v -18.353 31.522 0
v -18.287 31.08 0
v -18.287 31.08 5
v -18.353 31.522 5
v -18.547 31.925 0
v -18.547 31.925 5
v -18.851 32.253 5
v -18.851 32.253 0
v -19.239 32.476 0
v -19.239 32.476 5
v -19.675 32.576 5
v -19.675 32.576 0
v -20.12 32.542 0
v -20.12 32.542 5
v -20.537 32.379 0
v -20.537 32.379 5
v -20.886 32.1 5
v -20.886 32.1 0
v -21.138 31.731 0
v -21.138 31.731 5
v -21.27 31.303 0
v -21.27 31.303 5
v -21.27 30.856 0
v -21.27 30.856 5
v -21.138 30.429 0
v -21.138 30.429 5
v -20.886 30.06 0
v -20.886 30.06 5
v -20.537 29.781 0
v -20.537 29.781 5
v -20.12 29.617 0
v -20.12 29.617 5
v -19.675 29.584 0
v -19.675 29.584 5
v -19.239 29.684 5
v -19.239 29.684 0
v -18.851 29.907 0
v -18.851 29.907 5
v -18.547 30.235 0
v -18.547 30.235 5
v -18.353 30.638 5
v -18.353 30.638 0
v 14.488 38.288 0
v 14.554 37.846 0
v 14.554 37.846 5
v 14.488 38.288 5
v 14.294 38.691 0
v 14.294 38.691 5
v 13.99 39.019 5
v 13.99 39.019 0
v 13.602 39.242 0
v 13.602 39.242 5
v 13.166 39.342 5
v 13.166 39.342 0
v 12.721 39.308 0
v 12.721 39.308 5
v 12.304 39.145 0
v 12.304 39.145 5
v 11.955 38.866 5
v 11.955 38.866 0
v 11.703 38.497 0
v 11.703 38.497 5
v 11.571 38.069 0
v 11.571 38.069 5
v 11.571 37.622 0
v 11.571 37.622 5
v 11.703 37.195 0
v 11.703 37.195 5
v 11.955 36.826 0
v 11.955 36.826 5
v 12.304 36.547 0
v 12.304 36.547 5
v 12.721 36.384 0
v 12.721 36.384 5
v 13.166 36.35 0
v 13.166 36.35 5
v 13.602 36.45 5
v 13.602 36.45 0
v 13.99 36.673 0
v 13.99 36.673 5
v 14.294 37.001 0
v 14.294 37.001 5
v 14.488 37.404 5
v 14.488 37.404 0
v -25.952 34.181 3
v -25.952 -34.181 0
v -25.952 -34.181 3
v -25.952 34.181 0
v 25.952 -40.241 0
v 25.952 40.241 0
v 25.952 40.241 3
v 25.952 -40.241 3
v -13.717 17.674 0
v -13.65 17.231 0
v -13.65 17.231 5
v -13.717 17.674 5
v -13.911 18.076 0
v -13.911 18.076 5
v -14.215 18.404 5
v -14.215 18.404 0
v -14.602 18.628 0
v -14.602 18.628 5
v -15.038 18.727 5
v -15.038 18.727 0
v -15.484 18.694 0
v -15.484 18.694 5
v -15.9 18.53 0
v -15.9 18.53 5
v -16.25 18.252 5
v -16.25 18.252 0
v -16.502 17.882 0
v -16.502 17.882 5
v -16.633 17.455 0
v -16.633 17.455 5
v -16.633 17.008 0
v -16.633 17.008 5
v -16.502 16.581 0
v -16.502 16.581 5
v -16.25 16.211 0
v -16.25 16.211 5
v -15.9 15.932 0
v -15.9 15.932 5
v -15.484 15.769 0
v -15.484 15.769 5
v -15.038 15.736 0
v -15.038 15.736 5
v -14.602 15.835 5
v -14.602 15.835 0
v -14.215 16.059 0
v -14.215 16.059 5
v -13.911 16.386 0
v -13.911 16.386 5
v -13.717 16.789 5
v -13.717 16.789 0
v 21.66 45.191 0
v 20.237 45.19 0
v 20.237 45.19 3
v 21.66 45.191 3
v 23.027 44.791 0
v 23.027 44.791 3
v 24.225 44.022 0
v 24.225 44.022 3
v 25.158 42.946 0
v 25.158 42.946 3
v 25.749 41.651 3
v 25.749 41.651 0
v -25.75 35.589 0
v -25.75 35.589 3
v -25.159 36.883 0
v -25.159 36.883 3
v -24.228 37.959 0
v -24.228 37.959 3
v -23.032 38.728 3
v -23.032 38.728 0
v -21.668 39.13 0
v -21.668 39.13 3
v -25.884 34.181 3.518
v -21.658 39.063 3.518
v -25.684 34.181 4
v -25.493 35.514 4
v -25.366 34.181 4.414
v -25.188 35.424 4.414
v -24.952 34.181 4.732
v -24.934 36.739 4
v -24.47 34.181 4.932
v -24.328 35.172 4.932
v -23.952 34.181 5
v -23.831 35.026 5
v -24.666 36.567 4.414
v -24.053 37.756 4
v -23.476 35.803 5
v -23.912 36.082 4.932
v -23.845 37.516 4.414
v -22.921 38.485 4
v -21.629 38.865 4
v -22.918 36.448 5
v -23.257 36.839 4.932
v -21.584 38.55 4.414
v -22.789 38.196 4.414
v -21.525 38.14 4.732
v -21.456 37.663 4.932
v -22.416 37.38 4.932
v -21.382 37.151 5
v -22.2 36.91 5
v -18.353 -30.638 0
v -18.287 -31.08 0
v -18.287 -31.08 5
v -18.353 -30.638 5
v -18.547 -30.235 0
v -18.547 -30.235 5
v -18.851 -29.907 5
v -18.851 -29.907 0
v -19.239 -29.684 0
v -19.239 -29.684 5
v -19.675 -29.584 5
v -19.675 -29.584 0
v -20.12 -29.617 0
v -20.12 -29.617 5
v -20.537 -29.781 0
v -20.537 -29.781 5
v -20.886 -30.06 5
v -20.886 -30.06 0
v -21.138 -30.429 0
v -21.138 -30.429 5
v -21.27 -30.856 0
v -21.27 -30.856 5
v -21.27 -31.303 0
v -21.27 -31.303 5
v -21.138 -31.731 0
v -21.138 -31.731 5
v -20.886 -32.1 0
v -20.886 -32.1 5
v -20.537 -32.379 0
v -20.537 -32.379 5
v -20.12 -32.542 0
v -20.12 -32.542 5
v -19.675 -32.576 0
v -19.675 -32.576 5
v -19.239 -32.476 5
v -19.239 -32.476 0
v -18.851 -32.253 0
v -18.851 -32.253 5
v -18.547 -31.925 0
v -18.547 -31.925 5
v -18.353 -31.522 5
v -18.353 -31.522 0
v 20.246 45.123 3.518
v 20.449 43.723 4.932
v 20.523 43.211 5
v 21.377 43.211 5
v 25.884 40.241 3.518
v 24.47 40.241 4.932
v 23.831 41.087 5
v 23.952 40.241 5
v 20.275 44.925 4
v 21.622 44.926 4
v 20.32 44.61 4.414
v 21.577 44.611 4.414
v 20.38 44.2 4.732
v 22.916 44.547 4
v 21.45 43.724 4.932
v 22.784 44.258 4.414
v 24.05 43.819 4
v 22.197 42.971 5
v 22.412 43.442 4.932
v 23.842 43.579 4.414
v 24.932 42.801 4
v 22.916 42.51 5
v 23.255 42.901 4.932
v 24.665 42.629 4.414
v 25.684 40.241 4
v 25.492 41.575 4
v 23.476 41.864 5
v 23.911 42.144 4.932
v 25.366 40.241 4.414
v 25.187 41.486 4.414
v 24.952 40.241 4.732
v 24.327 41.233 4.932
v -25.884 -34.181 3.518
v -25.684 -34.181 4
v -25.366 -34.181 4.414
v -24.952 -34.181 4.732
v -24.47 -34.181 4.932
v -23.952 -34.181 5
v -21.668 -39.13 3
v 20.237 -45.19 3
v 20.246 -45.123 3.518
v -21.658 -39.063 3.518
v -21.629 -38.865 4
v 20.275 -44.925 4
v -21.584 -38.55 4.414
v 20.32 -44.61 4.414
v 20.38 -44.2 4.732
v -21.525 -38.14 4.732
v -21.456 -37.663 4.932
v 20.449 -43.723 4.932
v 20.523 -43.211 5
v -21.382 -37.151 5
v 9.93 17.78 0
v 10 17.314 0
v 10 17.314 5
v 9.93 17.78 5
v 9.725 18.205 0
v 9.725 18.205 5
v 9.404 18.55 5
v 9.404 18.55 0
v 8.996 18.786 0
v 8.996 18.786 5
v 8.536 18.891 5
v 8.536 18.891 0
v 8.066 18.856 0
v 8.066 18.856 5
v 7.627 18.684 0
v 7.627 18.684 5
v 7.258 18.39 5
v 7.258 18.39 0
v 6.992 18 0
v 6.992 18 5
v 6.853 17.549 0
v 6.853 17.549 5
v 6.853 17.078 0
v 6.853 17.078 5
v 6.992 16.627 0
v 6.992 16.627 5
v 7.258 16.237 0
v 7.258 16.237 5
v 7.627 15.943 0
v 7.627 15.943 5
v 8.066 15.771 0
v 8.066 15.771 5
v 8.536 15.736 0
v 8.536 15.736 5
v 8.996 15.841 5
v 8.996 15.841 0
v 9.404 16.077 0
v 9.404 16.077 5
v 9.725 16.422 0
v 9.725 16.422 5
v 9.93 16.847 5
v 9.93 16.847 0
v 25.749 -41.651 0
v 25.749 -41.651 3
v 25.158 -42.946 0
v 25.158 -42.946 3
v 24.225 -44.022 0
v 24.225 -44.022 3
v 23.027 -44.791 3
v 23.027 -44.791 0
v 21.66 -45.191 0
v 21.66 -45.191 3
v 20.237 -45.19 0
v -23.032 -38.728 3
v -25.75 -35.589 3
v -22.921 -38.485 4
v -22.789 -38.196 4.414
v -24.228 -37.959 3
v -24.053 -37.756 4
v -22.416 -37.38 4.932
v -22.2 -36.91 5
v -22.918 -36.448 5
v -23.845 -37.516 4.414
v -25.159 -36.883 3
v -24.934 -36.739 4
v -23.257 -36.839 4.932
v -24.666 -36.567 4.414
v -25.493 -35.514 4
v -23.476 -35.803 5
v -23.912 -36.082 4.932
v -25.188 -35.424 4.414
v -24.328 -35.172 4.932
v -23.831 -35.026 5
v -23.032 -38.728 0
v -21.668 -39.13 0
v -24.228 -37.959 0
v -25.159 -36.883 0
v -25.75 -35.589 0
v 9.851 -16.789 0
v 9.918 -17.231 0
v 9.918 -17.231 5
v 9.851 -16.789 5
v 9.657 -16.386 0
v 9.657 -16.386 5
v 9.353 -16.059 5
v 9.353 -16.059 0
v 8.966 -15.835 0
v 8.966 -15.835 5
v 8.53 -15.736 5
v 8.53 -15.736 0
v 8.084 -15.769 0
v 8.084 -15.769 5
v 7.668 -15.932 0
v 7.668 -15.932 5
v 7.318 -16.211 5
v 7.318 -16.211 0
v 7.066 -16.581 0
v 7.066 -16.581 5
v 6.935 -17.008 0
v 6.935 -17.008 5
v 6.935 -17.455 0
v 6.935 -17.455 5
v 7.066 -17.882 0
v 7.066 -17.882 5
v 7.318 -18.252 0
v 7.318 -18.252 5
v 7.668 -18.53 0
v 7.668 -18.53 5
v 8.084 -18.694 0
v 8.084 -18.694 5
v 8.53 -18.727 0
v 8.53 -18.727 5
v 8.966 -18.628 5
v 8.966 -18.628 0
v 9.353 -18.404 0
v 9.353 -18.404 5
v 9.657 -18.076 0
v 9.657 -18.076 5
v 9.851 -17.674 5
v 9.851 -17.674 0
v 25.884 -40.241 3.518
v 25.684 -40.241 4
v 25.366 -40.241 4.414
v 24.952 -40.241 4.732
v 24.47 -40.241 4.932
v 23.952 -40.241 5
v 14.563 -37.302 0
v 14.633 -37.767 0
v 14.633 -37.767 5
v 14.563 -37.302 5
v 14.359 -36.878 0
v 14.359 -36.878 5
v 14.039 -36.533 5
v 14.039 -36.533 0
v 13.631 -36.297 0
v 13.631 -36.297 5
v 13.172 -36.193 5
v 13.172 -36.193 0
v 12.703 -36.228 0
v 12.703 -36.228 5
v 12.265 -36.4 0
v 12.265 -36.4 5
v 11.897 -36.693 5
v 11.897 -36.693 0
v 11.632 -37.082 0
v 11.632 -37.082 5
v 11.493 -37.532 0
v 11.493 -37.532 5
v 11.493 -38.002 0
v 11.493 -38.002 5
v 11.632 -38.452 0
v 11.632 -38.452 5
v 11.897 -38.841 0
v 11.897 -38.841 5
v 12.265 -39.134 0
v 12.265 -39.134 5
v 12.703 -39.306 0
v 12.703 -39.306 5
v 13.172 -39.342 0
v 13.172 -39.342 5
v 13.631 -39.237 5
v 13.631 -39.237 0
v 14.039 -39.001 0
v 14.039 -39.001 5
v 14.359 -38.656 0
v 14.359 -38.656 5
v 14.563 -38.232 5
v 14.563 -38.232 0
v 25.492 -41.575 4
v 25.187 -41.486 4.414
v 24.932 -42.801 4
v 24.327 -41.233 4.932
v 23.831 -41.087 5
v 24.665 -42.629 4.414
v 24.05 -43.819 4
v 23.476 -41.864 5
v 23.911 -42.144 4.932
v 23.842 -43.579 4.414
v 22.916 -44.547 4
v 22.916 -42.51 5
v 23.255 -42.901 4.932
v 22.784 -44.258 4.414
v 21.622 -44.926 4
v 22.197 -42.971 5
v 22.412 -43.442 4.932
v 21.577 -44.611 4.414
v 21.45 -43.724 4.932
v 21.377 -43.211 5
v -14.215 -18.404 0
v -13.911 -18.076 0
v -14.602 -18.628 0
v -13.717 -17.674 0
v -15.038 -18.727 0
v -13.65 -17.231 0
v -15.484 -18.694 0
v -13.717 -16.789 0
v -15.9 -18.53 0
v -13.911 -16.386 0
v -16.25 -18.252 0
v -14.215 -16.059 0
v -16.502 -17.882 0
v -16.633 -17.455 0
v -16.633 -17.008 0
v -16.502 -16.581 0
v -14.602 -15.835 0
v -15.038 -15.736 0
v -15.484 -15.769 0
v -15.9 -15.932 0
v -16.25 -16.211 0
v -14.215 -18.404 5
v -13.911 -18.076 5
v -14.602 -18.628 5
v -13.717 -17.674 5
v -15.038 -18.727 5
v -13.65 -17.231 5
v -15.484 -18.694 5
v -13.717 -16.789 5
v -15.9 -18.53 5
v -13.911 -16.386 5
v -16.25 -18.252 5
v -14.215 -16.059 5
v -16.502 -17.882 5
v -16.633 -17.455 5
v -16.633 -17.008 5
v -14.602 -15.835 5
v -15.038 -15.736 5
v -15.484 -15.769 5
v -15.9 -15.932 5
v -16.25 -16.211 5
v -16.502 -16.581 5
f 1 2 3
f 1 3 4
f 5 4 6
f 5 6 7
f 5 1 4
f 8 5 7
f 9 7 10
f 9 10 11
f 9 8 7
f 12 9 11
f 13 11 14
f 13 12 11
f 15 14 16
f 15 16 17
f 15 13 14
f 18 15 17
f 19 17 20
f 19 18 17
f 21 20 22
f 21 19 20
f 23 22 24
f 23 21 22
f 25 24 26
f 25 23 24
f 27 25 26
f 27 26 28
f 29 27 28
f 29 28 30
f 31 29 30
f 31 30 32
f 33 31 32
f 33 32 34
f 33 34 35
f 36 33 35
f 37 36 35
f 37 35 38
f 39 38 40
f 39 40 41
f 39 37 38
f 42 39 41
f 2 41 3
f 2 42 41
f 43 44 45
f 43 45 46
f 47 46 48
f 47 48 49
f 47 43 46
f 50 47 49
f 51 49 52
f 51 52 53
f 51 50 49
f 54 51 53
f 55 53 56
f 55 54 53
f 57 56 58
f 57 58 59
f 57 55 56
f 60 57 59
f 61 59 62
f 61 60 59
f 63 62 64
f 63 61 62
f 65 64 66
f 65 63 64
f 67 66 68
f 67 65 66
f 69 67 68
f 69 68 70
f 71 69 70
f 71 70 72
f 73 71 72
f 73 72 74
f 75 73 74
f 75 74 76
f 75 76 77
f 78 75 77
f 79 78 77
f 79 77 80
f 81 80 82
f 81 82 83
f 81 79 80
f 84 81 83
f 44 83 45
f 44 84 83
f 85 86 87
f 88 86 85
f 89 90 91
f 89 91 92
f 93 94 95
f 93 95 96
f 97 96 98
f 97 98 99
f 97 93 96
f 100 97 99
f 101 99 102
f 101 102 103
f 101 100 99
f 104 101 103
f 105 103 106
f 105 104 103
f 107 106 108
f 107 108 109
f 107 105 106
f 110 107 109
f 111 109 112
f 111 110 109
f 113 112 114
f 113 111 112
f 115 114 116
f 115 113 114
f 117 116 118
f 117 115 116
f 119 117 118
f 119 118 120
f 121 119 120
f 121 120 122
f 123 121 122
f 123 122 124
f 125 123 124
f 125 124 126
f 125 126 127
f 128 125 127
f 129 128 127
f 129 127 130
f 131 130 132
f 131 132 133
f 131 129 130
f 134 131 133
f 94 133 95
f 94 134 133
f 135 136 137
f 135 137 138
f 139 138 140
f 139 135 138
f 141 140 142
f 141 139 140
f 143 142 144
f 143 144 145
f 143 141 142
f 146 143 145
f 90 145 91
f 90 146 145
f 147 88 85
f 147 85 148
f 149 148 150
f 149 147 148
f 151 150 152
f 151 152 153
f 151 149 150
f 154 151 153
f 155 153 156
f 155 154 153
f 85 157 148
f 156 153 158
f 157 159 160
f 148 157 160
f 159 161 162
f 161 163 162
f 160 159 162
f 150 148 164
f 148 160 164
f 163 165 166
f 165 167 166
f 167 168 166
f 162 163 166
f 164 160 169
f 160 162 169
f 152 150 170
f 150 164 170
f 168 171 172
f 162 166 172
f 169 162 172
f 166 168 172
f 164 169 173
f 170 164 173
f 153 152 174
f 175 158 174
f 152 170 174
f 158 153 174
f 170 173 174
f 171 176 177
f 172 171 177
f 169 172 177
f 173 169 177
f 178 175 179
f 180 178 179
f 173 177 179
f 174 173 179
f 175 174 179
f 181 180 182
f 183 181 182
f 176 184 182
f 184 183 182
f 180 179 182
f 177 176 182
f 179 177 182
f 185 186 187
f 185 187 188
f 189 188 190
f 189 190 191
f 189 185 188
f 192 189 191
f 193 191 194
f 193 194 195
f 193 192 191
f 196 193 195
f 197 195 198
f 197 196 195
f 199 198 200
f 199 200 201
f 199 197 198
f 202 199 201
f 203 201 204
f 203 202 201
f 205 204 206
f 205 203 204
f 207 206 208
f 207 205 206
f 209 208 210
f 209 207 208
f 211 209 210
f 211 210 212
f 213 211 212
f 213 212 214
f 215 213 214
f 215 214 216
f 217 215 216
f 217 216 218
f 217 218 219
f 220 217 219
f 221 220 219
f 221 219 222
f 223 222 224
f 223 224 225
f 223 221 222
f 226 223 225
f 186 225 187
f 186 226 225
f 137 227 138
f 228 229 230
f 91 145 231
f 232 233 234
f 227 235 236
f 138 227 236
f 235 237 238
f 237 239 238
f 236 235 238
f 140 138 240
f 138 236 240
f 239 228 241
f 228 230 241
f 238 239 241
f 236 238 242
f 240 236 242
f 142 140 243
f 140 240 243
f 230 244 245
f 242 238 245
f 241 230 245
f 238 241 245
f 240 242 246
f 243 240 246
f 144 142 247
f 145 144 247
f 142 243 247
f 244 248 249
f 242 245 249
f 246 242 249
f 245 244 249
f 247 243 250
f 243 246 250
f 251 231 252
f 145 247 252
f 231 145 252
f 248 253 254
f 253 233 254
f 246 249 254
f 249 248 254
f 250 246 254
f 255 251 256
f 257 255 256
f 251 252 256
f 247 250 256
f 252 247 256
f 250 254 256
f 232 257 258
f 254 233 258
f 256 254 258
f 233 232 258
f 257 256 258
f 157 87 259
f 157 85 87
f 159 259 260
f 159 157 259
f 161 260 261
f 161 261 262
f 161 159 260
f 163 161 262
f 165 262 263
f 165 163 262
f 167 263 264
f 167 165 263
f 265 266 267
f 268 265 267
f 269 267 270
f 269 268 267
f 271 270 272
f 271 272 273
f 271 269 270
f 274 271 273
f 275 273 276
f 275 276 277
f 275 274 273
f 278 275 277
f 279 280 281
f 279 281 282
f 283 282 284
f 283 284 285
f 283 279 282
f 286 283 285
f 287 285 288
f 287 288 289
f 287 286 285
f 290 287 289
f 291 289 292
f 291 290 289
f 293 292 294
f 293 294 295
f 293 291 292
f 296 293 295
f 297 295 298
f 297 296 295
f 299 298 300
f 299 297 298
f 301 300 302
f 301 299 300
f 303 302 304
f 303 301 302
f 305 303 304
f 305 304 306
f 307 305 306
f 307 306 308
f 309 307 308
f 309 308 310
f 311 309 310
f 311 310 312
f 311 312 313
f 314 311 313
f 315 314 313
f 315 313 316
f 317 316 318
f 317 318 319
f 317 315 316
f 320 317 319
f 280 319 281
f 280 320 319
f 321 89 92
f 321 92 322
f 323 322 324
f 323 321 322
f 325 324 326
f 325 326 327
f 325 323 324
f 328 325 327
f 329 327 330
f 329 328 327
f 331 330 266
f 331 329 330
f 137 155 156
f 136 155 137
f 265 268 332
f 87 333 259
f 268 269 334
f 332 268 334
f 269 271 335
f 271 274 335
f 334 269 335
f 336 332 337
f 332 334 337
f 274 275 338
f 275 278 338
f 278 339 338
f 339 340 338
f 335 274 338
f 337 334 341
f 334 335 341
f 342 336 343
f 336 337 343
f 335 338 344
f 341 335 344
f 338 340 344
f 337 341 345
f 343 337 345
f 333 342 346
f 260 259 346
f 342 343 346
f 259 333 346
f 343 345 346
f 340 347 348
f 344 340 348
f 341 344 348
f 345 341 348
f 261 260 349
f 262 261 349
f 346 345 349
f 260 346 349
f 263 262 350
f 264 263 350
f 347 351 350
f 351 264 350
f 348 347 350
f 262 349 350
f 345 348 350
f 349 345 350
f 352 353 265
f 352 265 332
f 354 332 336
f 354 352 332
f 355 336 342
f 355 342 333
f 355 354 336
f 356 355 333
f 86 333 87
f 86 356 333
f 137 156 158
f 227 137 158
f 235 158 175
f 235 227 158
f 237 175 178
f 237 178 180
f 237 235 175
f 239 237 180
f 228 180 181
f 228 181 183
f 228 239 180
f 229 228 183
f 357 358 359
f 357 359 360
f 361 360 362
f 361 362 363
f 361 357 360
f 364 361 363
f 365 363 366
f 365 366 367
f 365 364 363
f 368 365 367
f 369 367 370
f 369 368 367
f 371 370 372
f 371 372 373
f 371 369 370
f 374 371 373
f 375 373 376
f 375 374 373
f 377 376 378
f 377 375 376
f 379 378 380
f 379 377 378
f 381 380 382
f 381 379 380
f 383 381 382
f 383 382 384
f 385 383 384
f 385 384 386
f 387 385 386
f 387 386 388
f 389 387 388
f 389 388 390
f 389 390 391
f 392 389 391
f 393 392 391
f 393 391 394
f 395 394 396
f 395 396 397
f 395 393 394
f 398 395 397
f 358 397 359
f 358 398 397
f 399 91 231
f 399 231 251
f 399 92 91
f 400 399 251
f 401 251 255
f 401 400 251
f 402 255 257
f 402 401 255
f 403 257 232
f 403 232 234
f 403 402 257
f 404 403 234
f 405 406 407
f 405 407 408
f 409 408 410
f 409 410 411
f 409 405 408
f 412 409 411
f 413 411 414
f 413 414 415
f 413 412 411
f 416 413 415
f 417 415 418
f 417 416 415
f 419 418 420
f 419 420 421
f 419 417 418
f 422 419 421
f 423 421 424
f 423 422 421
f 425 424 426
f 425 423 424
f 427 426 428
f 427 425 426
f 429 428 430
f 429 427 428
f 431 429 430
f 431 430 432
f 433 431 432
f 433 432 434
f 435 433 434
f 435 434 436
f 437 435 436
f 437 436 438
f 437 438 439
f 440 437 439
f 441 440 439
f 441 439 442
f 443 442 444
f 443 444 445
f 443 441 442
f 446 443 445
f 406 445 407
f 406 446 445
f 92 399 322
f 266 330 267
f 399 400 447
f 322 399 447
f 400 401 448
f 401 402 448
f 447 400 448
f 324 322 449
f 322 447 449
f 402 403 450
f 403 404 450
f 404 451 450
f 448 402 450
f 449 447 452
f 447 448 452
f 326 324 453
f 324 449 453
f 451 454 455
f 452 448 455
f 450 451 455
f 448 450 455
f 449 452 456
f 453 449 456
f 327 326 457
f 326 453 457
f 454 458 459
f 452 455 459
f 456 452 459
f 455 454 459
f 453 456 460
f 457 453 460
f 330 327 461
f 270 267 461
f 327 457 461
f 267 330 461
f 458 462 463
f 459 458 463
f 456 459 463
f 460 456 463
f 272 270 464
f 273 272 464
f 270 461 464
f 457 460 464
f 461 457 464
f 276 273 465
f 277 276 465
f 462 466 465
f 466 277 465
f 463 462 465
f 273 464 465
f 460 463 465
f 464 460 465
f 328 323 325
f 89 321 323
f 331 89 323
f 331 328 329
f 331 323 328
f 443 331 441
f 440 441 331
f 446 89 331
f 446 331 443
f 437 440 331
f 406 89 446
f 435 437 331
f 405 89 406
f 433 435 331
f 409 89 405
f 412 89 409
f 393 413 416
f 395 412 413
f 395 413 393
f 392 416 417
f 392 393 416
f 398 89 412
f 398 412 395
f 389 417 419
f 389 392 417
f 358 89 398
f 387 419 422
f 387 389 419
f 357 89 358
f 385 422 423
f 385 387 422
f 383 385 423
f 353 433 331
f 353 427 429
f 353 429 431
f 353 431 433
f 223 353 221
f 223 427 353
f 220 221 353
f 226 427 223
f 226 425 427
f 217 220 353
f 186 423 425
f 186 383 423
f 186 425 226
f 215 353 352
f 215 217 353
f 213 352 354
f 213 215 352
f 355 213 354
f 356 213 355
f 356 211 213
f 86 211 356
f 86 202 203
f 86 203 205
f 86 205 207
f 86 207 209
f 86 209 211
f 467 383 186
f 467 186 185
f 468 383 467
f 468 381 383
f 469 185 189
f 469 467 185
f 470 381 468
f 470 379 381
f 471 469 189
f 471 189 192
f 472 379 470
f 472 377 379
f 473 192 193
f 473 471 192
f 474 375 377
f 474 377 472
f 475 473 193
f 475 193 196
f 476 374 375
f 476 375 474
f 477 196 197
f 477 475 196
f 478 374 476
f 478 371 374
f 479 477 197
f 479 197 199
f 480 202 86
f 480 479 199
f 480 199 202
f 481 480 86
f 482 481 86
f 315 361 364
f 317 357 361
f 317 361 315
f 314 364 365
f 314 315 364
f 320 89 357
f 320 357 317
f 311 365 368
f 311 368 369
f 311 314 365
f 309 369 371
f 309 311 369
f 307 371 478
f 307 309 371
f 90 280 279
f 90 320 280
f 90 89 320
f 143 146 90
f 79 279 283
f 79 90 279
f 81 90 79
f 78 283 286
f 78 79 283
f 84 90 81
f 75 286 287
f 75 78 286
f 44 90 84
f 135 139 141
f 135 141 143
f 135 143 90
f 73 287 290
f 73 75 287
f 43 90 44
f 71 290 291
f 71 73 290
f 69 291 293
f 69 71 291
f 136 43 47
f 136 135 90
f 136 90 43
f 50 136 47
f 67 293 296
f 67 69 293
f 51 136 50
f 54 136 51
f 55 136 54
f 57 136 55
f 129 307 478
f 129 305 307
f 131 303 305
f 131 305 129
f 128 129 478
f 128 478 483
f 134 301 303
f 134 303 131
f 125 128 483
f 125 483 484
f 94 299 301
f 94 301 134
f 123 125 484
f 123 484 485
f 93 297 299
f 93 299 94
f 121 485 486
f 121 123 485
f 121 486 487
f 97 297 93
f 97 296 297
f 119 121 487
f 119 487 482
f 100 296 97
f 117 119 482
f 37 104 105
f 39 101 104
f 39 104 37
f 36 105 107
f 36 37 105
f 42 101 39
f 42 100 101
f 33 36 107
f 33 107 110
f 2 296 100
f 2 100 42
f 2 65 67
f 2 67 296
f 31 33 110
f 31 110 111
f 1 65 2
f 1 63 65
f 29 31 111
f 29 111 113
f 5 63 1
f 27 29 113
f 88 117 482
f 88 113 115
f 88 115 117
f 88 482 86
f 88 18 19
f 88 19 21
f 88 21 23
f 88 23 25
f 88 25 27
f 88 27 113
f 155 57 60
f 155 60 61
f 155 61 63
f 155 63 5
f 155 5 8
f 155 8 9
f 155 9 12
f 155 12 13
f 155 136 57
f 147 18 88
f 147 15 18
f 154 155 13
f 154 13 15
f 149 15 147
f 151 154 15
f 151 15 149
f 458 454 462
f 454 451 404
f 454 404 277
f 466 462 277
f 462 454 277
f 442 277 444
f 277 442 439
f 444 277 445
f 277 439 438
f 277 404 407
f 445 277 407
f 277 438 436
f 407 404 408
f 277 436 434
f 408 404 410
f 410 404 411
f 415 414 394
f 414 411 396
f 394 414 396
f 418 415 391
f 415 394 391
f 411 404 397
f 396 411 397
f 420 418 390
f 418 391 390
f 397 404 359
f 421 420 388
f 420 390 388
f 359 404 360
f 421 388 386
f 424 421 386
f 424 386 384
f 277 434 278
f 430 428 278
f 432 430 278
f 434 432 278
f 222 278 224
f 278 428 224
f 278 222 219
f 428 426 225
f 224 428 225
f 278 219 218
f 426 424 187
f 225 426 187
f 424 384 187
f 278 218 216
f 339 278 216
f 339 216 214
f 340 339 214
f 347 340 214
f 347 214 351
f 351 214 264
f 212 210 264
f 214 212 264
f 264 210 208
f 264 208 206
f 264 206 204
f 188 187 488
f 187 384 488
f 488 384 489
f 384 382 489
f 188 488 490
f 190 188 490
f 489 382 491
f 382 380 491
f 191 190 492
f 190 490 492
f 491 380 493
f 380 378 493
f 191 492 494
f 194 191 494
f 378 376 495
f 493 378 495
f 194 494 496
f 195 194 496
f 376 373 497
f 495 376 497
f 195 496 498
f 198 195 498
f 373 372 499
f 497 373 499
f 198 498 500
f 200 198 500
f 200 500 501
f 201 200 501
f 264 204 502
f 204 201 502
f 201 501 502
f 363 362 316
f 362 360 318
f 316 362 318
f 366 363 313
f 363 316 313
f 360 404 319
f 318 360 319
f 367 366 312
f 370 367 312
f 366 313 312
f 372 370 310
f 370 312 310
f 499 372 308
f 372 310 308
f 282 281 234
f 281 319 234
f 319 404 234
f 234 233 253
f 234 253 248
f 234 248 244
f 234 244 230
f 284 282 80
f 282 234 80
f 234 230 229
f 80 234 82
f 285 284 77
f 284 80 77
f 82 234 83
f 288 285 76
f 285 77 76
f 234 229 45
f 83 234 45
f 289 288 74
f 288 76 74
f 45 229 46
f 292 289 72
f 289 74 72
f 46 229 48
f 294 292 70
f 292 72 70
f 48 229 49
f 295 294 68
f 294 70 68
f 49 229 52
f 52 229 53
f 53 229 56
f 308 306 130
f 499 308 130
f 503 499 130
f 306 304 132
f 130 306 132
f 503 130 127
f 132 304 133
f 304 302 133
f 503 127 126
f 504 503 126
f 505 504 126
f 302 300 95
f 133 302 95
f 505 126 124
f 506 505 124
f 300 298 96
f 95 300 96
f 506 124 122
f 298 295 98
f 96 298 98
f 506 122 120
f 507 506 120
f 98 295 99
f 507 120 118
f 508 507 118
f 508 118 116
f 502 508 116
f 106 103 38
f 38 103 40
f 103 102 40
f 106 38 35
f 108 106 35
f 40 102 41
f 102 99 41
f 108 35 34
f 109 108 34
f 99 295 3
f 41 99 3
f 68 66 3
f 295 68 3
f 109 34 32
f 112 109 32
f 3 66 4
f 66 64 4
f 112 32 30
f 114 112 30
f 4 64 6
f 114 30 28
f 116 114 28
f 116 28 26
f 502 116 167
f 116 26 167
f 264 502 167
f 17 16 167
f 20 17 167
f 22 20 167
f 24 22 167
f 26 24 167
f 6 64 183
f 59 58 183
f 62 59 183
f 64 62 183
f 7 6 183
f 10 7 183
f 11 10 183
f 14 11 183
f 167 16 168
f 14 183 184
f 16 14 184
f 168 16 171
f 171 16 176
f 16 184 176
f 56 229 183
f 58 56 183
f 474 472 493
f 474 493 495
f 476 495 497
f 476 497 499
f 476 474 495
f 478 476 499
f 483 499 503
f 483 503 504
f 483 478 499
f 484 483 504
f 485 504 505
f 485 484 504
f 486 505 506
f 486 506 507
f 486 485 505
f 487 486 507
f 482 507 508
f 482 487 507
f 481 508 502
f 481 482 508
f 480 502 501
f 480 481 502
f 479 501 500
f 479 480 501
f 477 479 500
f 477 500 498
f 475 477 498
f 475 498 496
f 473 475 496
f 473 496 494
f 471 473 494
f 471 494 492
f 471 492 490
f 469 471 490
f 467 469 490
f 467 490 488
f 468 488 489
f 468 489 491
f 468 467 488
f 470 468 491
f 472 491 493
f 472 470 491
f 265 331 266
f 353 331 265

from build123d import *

# Parameters (mm, degrees)
ESQUISSE1_R        = 1.578798566
ESQUISSE1_R_2      = 1.5
ESQUISSE1_R_3      = 1.58210763
BOSS_EXTRU_1_DEPTH = 5
CONG_1_R           = 2


with BuildPart() as part:
    # Esquisse1 → Boss.-Extru.1 (new body)
    with BuildSketch(Plane.XY):
        with BuildLine():
            Line((20.236568094, -45.190021555), (-21.667832927, -39.130000484))
            ThreePointArc((-21.667832927, -39.130000484), (-24.732290594, -37.454232491), (-25.952200511, -34.181478458))
            Line((-25.952200511, -34.181478458), (-25.952200511, 34.181478458))
            ThreePointArc((-25.952200511, 34.181478458), (-24.732290594, 37.454232491), (-21.667832927, 39.130000484))
            Line((-21.667832927, 39.130000484), (20.236568094, 45.190021555))
            ThreePointArc((20.236568094, 45.190021555), (24.224954543, 44.021589613), (25.952200511, 40.241499529))
            Line((25.952200511, 40.241499529), (25.952200511, -40.241499529))
            ThreePointArc((25.952200511, -40.241499529), (24.224954543, -44.021589613), (20.236568094, -45.190021555))
        make_face()
        with Locations((13.054361823, -37.76712052)):
            Circle(ESQUISSE1_R, mode=Mode.SUBTRACT)
        with Locations((-19.786707419, -31.079856582)):
            Circle(ESQUISSE1_R_2, mode=Mode.SUBTRACT)
        with Locations((8.417830834, -17.231443917)):
            Circle(ESQUISSE1_R_2, mode=Mode.SUBTRACT)
        with Locations((-15.15017643, -17.231443917)):
            Circle(ESQUISSE1_R_2, mode=Mode.SUBTRACT)
        with Locations((8.417830834, 17.313551547)):
            Circle(ESQUISSE1_R_3, mode=Mode.SUBTRACT)
        with Locations((-15.15017643, 17.231443917)):
            Circle(ESQUISSE1_R_2, mode=Mode.SUBTRACT)
        with Locations((-19.786707419, 31.079856582)):
            Circle(ESQUISSE1_R_2, mode=Mode.SUBTRACT)
        with Locations((13.054361823, 37.845919086)):
            Circle(ESQUISSE1_R_2, mode=Mode.SUBTRACT)
    extrude(amount=BOSS_EXTRU_1_DEPTH)

    # Congé1
    cong_1_edges = [part.edges().sort_by_distance(p)[0] for p in [
        (-24.732290594, 37.454232491, 5),
        (-25.952200511, 0, 5),
        (-24.732290594, -37.454232491, 5),
        (-0.715632416, -42.16001102, 5),
        (24.224954543, -44.021589613, 5),
        (25.952200511, 0, 5),
        (24.224954543, 44.021589613, 5),
        (-0.715632416, 42.16001102, 5),
    ]]
    fillet(cong_1_edges, radius=CONG_1_R)


solid = part.part
